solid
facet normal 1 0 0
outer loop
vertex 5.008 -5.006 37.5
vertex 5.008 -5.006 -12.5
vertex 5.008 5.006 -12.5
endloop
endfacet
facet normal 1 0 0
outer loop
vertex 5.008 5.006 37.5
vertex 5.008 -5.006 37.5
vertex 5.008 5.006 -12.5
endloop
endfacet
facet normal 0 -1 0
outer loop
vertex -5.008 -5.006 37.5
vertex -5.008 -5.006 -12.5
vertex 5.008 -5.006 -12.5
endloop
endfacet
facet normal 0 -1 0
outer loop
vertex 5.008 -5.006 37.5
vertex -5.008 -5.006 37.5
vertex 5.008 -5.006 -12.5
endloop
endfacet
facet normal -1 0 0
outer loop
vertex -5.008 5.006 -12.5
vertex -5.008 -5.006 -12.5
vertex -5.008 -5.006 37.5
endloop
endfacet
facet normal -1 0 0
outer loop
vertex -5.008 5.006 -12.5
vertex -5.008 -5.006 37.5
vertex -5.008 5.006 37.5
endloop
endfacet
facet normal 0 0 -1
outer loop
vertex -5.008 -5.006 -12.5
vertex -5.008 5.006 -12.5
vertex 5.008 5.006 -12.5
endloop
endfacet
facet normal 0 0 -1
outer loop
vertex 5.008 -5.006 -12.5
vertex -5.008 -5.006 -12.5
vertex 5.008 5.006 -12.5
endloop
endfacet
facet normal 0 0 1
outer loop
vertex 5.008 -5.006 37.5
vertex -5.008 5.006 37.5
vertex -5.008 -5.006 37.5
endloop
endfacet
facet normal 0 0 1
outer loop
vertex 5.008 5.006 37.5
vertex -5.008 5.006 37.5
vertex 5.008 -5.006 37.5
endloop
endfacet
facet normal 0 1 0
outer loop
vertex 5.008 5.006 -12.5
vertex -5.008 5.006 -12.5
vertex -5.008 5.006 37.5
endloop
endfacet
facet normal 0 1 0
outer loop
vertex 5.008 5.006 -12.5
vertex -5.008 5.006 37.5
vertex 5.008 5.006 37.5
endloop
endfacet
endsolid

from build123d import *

# Parameters (mm, degrees)
F0_R     = 15
F1_DEPTH = 12.5
F2_W     = 10.0157754496
F2_H     = 10.012964718
F3_DEPTH = 25
F4_DEPTH = 25


# Not quite as in the source:
# - a feature of the source that left no trace in its solid (it failed there, or was rolled back) is left out


with BuildPart() as f1:
    # F0 (on Top) → F1 (new body, symmetric)
    with BuildSketch(Plane.XY):
        Circle(F0_R)
    extrude(amount=F1_DEPTH, both=True)

    # F2 (on face) → F3 (join)
    with BuildSketch(Plane.XY.offset(12.5)):
        Rectangle(F2_W, F2_H)
    extrude(amount=F3_DEPTH)

    # F4 (cut): a face of the model
    f4_faces = [f1.faces().sort_by_distance(p)[0] for p in [
        (-14.5757359313, 0, 12.5),
    ]]
    extrude(f4_faces, amount=-F4_DEPTH, mode=Mode.SUBTRACT)


solid = f1.part
